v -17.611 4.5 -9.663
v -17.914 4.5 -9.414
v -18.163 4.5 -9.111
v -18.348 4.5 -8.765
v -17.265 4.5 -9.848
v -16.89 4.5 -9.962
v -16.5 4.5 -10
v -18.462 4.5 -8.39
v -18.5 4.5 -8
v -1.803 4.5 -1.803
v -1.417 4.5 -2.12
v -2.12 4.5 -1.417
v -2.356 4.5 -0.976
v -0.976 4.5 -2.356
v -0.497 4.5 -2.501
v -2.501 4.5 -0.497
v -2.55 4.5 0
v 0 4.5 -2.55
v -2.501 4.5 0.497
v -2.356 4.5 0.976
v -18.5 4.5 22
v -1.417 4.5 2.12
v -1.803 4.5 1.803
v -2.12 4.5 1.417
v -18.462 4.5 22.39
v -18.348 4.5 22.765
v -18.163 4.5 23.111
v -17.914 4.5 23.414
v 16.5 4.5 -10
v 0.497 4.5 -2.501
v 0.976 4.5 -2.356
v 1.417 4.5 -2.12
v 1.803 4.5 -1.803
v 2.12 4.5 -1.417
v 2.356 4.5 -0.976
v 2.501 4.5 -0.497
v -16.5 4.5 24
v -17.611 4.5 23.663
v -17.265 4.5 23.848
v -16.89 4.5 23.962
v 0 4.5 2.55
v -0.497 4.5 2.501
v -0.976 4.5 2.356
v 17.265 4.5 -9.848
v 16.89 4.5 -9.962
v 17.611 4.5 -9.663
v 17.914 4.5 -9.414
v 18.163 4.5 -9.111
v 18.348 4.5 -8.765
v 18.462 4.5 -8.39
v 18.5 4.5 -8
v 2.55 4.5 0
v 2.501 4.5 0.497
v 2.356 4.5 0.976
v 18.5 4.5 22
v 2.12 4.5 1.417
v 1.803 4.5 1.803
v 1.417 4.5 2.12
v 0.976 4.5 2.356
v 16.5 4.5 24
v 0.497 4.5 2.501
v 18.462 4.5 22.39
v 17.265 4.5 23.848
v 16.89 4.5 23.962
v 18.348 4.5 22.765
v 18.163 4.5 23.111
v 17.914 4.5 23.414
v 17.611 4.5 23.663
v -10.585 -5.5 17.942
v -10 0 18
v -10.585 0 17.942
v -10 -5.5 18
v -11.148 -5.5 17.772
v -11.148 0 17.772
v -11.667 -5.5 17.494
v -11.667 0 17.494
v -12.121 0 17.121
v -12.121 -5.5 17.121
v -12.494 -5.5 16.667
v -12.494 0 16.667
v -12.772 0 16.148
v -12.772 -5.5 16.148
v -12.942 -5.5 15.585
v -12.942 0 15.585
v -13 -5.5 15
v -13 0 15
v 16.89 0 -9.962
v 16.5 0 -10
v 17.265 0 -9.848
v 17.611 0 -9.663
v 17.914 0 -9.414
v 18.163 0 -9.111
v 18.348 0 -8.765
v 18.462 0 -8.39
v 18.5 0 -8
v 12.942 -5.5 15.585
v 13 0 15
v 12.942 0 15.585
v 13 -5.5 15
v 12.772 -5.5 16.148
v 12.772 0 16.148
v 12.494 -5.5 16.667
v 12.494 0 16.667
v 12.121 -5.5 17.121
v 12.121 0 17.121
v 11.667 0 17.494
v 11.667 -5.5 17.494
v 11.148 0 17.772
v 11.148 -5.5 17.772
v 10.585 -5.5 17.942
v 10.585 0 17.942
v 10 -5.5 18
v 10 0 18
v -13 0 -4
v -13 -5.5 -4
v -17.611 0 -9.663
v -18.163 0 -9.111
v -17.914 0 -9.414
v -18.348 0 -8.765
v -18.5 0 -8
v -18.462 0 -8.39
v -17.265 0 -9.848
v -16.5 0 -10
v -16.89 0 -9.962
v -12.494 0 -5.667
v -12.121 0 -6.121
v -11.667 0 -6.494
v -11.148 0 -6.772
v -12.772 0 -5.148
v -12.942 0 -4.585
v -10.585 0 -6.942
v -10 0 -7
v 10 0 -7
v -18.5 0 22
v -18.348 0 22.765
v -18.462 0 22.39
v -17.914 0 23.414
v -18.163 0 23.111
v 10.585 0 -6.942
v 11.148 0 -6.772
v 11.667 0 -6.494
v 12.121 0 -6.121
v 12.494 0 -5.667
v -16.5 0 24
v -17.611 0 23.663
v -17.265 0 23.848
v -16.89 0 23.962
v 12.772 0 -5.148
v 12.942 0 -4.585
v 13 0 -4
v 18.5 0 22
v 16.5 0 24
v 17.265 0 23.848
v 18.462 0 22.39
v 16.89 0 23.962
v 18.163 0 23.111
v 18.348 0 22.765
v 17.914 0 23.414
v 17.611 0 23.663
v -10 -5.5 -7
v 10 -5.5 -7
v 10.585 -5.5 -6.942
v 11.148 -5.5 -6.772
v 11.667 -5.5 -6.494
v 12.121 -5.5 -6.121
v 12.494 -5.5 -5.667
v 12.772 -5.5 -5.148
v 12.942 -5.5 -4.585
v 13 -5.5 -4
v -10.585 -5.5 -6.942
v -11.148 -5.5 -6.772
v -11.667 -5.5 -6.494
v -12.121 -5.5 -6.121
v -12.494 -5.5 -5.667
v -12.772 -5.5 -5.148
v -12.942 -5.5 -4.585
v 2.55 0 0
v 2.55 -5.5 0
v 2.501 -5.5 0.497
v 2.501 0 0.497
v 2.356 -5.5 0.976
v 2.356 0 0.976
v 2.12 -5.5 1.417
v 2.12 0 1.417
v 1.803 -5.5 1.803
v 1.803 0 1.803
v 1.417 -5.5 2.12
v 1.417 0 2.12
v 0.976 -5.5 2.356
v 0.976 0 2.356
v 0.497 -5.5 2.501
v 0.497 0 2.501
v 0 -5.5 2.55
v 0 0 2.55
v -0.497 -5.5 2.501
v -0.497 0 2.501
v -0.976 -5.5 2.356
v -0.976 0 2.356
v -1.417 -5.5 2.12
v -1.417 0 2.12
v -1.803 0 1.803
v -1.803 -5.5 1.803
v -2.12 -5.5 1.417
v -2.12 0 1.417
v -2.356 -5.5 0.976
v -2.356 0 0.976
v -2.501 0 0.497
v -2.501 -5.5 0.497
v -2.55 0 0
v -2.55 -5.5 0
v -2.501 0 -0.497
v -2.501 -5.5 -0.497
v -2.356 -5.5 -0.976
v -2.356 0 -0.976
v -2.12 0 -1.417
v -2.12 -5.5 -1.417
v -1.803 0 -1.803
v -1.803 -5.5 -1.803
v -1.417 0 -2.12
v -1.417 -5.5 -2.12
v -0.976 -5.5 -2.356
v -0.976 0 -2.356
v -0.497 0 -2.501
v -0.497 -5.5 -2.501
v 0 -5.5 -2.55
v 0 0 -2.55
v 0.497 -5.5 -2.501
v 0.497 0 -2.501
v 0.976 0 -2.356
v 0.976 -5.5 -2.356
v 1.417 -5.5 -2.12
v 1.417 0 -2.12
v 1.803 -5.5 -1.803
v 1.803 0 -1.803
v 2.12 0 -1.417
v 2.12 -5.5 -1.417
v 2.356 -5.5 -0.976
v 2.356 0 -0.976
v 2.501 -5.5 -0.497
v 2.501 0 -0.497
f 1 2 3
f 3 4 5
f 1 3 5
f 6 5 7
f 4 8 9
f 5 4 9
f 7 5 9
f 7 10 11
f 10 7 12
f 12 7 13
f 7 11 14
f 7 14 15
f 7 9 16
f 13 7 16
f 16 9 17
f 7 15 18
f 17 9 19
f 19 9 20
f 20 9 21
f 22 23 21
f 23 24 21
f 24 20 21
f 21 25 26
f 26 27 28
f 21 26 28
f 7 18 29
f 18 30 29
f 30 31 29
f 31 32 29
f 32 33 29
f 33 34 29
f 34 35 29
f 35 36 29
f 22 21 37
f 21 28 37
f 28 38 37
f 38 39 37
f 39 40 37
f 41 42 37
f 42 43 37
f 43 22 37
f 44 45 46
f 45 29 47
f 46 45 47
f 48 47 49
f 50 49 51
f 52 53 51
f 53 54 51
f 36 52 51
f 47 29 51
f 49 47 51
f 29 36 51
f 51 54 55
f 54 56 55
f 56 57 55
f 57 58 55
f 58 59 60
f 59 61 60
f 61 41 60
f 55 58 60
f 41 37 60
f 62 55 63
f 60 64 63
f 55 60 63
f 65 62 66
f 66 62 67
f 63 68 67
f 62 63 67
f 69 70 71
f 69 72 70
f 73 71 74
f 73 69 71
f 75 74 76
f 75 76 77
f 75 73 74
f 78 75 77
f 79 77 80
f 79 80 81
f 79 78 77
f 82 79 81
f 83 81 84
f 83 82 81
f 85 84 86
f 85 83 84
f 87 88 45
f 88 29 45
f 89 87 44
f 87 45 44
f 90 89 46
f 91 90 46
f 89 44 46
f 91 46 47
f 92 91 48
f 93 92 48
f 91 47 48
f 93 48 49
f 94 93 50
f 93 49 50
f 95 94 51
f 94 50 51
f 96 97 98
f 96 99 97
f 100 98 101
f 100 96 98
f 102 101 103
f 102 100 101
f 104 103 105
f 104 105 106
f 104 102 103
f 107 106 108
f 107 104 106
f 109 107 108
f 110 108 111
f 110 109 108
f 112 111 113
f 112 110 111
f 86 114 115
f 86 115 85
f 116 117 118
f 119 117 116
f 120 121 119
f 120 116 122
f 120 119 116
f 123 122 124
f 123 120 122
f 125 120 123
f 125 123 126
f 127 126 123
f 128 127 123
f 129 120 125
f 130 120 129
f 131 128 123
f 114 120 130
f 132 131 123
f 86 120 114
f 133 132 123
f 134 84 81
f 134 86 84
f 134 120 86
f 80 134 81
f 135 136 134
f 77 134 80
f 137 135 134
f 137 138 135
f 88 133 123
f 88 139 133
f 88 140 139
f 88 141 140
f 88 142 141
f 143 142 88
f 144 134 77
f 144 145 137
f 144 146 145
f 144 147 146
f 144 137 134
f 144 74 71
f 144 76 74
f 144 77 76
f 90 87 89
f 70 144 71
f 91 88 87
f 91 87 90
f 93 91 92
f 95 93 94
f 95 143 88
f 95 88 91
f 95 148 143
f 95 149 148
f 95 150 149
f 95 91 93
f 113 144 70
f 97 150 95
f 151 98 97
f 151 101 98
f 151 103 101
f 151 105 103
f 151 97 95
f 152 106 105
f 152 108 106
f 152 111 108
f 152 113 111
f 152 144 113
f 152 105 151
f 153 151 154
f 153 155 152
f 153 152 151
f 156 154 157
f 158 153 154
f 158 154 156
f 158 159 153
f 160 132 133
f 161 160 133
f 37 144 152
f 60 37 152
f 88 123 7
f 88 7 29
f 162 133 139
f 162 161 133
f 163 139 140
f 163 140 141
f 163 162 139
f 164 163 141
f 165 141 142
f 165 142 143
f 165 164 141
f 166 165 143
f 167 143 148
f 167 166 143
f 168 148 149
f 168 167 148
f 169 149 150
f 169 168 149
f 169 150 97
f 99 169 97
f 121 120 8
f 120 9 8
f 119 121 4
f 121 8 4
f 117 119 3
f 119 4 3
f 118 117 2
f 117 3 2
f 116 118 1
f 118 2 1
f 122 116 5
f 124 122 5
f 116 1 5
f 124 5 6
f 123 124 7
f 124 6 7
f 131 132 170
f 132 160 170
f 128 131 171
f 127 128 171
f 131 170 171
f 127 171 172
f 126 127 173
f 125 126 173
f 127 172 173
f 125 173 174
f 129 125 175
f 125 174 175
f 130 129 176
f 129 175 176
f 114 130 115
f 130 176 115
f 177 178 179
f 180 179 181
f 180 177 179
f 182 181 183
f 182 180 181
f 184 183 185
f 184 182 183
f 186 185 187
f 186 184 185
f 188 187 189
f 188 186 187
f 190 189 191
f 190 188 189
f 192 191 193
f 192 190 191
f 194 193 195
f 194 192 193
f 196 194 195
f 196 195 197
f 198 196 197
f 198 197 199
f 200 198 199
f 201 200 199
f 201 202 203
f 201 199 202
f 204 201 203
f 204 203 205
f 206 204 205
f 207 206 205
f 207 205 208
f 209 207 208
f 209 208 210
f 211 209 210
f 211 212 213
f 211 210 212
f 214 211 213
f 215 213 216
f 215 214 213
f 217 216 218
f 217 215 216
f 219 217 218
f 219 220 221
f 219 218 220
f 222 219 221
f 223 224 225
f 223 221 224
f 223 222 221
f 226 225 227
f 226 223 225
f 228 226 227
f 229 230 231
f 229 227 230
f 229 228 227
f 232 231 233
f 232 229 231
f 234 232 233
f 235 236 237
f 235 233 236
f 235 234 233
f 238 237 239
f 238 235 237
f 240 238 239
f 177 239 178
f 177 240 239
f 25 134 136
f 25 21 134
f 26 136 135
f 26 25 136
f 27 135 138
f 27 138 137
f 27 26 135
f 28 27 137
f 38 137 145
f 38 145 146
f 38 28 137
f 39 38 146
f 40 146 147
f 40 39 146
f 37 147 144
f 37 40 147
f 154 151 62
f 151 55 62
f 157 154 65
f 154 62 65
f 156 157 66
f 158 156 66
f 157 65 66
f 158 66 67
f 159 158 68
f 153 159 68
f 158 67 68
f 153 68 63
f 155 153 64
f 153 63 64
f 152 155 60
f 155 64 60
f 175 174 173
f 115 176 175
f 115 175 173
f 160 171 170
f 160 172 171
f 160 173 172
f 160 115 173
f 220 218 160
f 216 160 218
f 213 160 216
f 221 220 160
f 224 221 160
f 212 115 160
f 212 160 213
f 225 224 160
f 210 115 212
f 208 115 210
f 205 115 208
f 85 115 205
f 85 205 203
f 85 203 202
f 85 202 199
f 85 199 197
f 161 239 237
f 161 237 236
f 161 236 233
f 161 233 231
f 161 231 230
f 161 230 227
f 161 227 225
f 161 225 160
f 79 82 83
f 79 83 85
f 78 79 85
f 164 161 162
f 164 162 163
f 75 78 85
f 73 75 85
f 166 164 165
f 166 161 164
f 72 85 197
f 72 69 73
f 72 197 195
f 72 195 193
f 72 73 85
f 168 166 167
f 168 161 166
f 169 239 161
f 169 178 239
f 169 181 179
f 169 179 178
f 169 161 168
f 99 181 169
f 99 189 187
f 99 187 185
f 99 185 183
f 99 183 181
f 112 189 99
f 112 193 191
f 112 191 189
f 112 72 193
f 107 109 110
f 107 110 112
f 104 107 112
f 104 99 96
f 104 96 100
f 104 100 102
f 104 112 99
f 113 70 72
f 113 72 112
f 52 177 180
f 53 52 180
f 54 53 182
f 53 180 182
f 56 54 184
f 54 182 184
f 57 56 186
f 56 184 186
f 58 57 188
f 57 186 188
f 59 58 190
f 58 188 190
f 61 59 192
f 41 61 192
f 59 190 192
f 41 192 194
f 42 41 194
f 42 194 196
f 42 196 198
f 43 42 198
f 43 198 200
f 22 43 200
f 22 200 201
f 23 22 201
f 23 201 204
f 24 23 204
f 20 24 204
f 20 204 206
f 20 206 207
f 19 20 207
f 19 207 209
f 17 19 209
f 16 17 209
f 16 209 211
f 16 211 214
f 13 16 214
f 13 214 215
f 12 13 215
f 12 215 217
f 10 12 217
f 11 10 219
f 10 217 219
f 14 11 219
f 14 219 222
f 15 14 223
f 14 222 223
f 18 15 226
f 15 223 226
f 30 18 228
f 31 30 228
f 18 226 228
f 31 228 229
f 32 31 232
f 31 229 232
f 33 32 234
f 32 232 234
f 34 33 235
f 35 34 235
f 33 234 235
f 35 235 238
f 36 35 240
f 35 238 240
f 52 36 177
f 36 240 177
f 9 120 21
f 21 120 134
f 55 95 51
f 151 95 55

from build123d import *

# Parameters (mm, degrees)
SKETCH_W          = 37
SKETCH_H          = 34
PAD_DEPTH         = 4.5
FILLET_R          = 2
SKETCH001_W       = 26
SKETCH001_H       = 25
PAD001_DEPTH      = 5.5
FILLET001_R       = 3
SKETCH002_R       = 2.55
POCKET_DEPTH      = 4.501
POCKET_DEPTH_BACK = -5.501


with BuildPart() as part:
    # Sketch → Pad (new body)
    with BuildSketch(Plane.XZ):
        with Locations((0, 7)):
            Rectangle(SKETCH_W, SKETCH_H)
    extrude(amount=-PAD_DEPTH)

    # Fillet
    fillet_edges = [part.edges().sort_by_distance(p)[0] for p in [
        (18.5, 2.25, 24),
        (-18.5, 2.25, 24),
        (18.5, 2.25, -10),
        (-18.5, 2.25, -10),
    ]]
    fillet(fillet_edges, radius=FILLET_R)

    # Sketch001 → Pad001 (join)
    with BuildSketch(Plane.XZ):
        with Locations((0, 5.5)):
            Rectangle(SKETCH001_W, SKETCH001_H)
    extrude(amount=PAD001_DEPTH)

    # Fillet001
    fillet001_edges = [part.edges().sort_by_distance(p)[0] for p in [
        (-13, -2.75, -7),
        (13, -2.75, -7),
        (-13, -2.75, 18),
        (13, -2.75, 18),
    ]]
    fillet(fillet001_edges, radius=FILLET001_R)

    # Sketch002 → Pocket (cut, two sides)
    with BuildSketch(Plane.XZ) as pocket_sk:
        Circle(SKETCH002_R)
    extrude(amount=-POCKET_DEPTH, mode=Mode.SUBTRACT)
    extrude(pocket_sk.sketch, amount=-POCKET_DEPTH_BACK, mode=Mode.SUBTRACT)


solid = part.part
